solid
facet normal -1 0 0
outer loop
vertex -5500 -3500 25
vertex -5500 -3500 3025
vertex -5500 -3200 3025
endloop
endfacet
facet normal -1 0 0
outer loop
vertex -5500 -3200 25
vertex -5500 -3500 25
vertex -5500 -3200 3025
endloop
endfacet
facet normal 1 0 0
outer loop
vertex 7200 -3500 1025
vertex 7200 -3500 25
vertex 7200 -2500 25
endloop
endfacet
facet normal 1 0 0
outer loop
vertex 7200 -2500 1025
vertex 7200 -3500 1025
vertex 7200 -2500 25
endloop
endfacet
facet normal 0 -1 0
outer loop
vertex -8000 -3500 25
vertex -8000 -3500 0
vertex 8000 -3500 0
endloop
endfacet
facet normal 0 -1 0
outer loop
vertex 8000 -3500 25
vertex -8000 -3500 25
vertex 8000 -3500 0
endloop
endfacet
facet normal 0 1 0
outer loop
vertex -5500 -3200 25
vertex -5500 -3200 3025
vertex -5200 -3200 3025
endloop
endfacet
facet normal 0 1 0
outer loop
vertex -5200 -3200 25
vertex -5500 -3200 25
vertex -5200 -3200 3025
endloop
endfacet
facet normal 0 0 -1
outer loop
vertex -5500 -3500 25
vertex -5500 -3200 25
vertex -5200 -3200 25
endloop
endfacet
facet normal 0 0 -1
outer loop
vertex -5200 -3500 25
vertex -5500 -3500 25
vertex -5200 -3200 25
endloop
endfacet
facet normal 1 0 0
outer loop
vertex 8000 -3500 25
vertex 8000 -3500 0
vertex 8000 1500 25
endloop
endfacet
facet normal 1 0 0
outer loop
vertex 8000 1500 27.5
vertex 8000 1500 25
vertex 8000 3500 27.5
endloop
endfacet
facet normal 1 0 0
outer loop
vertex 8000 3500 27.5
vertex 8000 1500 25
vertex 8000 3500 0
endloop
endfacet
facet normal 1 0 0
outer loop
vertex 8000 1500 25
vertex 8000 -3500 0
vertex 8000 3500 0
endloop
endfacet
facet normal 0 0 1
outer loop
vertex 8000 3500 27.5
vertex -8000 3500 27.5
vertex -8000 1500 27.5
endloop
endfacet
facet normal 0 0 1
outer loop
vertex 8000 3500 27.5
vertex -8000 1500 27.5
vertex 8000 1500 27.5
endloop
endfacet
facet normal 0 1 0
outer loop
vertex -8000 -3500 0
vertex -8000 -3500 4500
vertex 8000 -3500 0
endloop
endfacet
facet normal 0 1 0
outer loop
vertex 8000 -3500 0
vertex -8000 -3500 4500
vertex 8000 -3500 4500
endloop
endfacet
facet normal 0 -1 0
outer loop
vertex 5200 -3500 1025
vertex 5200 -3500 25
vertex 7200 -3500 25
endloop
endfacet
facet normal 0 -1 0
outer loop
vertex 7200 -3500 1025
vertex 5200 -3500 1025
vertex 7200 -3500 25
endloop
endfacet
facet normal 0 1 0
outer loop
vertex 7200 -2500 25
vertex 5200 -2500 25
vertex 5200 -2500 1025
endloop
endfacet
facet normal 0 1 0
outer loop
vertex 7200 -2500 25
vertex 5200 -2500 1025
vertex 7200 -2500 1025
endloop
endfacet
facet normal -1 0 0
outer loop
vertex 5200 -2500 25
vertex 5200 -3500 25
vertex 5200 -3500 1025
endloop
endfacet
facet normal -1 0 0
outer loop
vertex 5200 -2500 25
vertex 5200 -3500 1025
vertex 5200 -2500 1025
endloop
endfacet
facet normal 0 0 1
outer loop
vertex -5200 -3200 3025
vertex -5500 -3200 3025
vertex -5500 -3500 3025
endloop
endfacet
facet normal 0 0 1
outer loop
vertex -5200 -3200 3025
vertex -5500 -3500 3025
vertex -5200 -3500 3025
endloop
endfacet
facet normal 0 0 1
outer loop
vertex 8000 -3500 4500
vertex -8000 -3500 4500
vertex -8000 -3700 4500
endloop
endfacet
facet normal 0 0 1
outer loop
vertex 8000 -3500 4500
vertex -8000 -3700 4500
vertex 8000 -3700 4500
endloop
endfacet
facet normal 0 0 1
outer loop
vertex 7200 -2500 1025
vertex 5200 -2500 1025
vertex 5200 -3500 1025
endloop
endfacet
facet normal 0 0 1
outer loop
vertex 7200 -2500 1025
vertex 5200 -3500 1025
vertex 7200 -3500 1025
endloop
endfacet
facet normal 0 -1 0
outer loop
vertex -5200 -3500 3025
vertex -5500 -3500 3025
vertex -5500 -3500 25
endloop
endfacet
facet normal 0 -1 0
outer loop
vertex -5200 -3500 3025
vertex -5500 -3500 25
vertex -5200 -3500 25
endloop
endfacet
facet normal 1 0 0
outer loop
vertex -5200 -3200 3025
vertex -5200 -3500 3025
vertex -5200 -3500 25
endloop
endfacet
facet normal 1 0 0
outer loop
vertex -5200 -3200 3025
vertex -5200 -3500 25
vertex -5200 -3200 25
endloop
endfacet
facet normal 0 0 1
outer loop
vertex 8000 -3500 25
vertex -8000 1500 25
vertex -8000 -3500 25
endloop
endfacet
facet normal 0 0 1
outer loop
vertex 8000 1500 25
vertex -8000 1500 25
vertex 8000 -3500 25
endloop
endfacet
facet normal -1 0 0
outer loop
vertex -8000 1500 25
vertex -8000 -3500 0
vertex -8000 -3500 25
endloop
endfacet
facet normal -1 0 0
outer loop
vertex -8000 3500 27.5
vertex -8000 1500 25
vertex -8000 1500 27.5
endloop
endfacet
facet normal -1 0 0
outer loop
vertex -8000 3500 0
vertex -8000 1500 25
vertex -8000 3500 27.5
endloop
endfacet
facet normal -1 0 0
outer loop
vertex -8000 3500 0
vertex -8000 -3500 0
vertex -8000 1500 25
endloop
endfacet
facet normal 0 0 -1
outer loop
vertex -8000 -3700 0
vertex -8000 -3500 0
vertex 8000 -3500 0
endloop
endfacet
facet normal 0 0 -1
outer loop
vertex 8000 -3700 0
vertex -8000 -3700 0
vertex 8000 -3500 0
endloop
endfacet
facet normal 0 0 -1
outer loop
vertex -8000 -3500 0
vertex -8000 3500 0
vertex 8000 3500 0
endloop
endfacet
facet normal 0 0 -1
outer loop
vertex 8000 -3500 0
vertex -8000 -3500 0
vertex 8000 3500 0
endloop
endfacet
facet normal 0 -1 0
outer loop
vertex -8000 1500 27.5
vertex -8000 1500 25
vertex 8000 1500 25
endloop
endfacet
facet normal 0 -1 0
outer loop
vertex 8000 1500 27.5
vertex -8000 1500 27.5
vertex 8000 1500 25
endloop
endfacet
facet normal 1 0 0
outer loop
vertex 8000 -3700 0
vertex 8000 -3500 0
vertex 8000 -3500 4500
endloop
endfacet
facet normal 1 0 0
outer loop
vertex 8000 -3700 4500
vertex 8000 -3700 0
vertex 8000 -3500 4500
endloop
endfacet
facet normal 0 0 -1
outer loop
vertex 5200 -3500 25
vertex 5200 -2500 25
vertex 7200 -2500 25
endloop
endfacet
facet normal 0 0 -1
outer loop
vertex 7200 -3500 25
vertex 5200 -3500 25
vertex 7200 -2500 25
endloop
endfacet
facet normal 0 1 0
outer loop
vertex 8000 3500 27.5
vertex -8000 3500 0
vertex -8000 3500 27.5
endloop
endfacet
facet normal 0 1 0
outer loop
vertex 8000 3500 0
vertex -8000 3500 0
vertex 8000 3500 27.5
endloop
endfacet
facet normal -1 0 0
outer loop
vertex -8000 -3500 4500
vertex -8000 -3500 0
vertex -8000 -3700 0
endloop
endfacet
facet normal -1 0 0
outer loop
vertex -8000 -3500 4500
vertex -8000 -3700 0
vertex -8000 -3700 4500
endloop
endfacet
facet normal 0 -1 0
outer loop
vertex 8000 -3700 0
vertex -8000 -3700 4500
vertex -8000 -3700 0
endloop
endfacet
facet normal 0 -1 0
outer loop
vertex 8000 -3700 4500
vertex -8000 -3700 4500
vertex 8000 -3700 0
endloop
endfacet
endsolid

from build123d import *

# Parameters (mm, degrees)
F0_W     = 16000
F0_H     = 7000
F1_DEPTH = 25
F2_W     = 16000
F2_H     = 2000
F4_DEPTH = 2.5
F3_W     = 16000
F3_H     = 4500
F5_DEPTH = 200
F6_W     = 300
F6_H     = 300
F7_DEPTH = 3000
F8_W     = 2000
F8_H     = 1000
F9_DEPTH = 1000


with BuildPart() as f1:
    # F0 (on Top) → F1 (new body)
    with BuildSketch(Plane.XY):
        Rectangle(F0_W, F0_H)
    extrude(amount=F1_DEPTH)

    # F2 (on face) → F4 (join)
    with BuildSketch(Plane.XY.offset(25)):
        with Locations((0, 2500)):
            Rectangle(F2_W, F2_H)
    extrude(amount=F4_DEPTH)


with BuildPart() as f5:
    # F3 (on face) → F5 (new body)
    with BuildSketch(Plane.XZ.offset(3500)):
        with Locations((0, 2250)):
            Rectangle(F3_W, F3_H)
    extrude(amount=F5_DEPTH)


with BuildPart() as f7:
    # F6 (on face) → F7 (new body)
    with BuildSketch(Plane.XY.offset(25)):
        with Locations((-5350, -3350)):
            Rectangle(F6_W, F6_H)
    extrude(amount=F7_DEPTH)


with BuildPart() as f9:
    # F8 (on face) → F9 (new body)
    with BuildSketch(Plane.XY.offset(25)):
        with Locations((6200, -3000)):
            Rectangle(F8_W, F8_H)
    extrude(amount=F9_DEPTH)


solid = Compound([f1.part, f5.part, f7.part, f9.part])
